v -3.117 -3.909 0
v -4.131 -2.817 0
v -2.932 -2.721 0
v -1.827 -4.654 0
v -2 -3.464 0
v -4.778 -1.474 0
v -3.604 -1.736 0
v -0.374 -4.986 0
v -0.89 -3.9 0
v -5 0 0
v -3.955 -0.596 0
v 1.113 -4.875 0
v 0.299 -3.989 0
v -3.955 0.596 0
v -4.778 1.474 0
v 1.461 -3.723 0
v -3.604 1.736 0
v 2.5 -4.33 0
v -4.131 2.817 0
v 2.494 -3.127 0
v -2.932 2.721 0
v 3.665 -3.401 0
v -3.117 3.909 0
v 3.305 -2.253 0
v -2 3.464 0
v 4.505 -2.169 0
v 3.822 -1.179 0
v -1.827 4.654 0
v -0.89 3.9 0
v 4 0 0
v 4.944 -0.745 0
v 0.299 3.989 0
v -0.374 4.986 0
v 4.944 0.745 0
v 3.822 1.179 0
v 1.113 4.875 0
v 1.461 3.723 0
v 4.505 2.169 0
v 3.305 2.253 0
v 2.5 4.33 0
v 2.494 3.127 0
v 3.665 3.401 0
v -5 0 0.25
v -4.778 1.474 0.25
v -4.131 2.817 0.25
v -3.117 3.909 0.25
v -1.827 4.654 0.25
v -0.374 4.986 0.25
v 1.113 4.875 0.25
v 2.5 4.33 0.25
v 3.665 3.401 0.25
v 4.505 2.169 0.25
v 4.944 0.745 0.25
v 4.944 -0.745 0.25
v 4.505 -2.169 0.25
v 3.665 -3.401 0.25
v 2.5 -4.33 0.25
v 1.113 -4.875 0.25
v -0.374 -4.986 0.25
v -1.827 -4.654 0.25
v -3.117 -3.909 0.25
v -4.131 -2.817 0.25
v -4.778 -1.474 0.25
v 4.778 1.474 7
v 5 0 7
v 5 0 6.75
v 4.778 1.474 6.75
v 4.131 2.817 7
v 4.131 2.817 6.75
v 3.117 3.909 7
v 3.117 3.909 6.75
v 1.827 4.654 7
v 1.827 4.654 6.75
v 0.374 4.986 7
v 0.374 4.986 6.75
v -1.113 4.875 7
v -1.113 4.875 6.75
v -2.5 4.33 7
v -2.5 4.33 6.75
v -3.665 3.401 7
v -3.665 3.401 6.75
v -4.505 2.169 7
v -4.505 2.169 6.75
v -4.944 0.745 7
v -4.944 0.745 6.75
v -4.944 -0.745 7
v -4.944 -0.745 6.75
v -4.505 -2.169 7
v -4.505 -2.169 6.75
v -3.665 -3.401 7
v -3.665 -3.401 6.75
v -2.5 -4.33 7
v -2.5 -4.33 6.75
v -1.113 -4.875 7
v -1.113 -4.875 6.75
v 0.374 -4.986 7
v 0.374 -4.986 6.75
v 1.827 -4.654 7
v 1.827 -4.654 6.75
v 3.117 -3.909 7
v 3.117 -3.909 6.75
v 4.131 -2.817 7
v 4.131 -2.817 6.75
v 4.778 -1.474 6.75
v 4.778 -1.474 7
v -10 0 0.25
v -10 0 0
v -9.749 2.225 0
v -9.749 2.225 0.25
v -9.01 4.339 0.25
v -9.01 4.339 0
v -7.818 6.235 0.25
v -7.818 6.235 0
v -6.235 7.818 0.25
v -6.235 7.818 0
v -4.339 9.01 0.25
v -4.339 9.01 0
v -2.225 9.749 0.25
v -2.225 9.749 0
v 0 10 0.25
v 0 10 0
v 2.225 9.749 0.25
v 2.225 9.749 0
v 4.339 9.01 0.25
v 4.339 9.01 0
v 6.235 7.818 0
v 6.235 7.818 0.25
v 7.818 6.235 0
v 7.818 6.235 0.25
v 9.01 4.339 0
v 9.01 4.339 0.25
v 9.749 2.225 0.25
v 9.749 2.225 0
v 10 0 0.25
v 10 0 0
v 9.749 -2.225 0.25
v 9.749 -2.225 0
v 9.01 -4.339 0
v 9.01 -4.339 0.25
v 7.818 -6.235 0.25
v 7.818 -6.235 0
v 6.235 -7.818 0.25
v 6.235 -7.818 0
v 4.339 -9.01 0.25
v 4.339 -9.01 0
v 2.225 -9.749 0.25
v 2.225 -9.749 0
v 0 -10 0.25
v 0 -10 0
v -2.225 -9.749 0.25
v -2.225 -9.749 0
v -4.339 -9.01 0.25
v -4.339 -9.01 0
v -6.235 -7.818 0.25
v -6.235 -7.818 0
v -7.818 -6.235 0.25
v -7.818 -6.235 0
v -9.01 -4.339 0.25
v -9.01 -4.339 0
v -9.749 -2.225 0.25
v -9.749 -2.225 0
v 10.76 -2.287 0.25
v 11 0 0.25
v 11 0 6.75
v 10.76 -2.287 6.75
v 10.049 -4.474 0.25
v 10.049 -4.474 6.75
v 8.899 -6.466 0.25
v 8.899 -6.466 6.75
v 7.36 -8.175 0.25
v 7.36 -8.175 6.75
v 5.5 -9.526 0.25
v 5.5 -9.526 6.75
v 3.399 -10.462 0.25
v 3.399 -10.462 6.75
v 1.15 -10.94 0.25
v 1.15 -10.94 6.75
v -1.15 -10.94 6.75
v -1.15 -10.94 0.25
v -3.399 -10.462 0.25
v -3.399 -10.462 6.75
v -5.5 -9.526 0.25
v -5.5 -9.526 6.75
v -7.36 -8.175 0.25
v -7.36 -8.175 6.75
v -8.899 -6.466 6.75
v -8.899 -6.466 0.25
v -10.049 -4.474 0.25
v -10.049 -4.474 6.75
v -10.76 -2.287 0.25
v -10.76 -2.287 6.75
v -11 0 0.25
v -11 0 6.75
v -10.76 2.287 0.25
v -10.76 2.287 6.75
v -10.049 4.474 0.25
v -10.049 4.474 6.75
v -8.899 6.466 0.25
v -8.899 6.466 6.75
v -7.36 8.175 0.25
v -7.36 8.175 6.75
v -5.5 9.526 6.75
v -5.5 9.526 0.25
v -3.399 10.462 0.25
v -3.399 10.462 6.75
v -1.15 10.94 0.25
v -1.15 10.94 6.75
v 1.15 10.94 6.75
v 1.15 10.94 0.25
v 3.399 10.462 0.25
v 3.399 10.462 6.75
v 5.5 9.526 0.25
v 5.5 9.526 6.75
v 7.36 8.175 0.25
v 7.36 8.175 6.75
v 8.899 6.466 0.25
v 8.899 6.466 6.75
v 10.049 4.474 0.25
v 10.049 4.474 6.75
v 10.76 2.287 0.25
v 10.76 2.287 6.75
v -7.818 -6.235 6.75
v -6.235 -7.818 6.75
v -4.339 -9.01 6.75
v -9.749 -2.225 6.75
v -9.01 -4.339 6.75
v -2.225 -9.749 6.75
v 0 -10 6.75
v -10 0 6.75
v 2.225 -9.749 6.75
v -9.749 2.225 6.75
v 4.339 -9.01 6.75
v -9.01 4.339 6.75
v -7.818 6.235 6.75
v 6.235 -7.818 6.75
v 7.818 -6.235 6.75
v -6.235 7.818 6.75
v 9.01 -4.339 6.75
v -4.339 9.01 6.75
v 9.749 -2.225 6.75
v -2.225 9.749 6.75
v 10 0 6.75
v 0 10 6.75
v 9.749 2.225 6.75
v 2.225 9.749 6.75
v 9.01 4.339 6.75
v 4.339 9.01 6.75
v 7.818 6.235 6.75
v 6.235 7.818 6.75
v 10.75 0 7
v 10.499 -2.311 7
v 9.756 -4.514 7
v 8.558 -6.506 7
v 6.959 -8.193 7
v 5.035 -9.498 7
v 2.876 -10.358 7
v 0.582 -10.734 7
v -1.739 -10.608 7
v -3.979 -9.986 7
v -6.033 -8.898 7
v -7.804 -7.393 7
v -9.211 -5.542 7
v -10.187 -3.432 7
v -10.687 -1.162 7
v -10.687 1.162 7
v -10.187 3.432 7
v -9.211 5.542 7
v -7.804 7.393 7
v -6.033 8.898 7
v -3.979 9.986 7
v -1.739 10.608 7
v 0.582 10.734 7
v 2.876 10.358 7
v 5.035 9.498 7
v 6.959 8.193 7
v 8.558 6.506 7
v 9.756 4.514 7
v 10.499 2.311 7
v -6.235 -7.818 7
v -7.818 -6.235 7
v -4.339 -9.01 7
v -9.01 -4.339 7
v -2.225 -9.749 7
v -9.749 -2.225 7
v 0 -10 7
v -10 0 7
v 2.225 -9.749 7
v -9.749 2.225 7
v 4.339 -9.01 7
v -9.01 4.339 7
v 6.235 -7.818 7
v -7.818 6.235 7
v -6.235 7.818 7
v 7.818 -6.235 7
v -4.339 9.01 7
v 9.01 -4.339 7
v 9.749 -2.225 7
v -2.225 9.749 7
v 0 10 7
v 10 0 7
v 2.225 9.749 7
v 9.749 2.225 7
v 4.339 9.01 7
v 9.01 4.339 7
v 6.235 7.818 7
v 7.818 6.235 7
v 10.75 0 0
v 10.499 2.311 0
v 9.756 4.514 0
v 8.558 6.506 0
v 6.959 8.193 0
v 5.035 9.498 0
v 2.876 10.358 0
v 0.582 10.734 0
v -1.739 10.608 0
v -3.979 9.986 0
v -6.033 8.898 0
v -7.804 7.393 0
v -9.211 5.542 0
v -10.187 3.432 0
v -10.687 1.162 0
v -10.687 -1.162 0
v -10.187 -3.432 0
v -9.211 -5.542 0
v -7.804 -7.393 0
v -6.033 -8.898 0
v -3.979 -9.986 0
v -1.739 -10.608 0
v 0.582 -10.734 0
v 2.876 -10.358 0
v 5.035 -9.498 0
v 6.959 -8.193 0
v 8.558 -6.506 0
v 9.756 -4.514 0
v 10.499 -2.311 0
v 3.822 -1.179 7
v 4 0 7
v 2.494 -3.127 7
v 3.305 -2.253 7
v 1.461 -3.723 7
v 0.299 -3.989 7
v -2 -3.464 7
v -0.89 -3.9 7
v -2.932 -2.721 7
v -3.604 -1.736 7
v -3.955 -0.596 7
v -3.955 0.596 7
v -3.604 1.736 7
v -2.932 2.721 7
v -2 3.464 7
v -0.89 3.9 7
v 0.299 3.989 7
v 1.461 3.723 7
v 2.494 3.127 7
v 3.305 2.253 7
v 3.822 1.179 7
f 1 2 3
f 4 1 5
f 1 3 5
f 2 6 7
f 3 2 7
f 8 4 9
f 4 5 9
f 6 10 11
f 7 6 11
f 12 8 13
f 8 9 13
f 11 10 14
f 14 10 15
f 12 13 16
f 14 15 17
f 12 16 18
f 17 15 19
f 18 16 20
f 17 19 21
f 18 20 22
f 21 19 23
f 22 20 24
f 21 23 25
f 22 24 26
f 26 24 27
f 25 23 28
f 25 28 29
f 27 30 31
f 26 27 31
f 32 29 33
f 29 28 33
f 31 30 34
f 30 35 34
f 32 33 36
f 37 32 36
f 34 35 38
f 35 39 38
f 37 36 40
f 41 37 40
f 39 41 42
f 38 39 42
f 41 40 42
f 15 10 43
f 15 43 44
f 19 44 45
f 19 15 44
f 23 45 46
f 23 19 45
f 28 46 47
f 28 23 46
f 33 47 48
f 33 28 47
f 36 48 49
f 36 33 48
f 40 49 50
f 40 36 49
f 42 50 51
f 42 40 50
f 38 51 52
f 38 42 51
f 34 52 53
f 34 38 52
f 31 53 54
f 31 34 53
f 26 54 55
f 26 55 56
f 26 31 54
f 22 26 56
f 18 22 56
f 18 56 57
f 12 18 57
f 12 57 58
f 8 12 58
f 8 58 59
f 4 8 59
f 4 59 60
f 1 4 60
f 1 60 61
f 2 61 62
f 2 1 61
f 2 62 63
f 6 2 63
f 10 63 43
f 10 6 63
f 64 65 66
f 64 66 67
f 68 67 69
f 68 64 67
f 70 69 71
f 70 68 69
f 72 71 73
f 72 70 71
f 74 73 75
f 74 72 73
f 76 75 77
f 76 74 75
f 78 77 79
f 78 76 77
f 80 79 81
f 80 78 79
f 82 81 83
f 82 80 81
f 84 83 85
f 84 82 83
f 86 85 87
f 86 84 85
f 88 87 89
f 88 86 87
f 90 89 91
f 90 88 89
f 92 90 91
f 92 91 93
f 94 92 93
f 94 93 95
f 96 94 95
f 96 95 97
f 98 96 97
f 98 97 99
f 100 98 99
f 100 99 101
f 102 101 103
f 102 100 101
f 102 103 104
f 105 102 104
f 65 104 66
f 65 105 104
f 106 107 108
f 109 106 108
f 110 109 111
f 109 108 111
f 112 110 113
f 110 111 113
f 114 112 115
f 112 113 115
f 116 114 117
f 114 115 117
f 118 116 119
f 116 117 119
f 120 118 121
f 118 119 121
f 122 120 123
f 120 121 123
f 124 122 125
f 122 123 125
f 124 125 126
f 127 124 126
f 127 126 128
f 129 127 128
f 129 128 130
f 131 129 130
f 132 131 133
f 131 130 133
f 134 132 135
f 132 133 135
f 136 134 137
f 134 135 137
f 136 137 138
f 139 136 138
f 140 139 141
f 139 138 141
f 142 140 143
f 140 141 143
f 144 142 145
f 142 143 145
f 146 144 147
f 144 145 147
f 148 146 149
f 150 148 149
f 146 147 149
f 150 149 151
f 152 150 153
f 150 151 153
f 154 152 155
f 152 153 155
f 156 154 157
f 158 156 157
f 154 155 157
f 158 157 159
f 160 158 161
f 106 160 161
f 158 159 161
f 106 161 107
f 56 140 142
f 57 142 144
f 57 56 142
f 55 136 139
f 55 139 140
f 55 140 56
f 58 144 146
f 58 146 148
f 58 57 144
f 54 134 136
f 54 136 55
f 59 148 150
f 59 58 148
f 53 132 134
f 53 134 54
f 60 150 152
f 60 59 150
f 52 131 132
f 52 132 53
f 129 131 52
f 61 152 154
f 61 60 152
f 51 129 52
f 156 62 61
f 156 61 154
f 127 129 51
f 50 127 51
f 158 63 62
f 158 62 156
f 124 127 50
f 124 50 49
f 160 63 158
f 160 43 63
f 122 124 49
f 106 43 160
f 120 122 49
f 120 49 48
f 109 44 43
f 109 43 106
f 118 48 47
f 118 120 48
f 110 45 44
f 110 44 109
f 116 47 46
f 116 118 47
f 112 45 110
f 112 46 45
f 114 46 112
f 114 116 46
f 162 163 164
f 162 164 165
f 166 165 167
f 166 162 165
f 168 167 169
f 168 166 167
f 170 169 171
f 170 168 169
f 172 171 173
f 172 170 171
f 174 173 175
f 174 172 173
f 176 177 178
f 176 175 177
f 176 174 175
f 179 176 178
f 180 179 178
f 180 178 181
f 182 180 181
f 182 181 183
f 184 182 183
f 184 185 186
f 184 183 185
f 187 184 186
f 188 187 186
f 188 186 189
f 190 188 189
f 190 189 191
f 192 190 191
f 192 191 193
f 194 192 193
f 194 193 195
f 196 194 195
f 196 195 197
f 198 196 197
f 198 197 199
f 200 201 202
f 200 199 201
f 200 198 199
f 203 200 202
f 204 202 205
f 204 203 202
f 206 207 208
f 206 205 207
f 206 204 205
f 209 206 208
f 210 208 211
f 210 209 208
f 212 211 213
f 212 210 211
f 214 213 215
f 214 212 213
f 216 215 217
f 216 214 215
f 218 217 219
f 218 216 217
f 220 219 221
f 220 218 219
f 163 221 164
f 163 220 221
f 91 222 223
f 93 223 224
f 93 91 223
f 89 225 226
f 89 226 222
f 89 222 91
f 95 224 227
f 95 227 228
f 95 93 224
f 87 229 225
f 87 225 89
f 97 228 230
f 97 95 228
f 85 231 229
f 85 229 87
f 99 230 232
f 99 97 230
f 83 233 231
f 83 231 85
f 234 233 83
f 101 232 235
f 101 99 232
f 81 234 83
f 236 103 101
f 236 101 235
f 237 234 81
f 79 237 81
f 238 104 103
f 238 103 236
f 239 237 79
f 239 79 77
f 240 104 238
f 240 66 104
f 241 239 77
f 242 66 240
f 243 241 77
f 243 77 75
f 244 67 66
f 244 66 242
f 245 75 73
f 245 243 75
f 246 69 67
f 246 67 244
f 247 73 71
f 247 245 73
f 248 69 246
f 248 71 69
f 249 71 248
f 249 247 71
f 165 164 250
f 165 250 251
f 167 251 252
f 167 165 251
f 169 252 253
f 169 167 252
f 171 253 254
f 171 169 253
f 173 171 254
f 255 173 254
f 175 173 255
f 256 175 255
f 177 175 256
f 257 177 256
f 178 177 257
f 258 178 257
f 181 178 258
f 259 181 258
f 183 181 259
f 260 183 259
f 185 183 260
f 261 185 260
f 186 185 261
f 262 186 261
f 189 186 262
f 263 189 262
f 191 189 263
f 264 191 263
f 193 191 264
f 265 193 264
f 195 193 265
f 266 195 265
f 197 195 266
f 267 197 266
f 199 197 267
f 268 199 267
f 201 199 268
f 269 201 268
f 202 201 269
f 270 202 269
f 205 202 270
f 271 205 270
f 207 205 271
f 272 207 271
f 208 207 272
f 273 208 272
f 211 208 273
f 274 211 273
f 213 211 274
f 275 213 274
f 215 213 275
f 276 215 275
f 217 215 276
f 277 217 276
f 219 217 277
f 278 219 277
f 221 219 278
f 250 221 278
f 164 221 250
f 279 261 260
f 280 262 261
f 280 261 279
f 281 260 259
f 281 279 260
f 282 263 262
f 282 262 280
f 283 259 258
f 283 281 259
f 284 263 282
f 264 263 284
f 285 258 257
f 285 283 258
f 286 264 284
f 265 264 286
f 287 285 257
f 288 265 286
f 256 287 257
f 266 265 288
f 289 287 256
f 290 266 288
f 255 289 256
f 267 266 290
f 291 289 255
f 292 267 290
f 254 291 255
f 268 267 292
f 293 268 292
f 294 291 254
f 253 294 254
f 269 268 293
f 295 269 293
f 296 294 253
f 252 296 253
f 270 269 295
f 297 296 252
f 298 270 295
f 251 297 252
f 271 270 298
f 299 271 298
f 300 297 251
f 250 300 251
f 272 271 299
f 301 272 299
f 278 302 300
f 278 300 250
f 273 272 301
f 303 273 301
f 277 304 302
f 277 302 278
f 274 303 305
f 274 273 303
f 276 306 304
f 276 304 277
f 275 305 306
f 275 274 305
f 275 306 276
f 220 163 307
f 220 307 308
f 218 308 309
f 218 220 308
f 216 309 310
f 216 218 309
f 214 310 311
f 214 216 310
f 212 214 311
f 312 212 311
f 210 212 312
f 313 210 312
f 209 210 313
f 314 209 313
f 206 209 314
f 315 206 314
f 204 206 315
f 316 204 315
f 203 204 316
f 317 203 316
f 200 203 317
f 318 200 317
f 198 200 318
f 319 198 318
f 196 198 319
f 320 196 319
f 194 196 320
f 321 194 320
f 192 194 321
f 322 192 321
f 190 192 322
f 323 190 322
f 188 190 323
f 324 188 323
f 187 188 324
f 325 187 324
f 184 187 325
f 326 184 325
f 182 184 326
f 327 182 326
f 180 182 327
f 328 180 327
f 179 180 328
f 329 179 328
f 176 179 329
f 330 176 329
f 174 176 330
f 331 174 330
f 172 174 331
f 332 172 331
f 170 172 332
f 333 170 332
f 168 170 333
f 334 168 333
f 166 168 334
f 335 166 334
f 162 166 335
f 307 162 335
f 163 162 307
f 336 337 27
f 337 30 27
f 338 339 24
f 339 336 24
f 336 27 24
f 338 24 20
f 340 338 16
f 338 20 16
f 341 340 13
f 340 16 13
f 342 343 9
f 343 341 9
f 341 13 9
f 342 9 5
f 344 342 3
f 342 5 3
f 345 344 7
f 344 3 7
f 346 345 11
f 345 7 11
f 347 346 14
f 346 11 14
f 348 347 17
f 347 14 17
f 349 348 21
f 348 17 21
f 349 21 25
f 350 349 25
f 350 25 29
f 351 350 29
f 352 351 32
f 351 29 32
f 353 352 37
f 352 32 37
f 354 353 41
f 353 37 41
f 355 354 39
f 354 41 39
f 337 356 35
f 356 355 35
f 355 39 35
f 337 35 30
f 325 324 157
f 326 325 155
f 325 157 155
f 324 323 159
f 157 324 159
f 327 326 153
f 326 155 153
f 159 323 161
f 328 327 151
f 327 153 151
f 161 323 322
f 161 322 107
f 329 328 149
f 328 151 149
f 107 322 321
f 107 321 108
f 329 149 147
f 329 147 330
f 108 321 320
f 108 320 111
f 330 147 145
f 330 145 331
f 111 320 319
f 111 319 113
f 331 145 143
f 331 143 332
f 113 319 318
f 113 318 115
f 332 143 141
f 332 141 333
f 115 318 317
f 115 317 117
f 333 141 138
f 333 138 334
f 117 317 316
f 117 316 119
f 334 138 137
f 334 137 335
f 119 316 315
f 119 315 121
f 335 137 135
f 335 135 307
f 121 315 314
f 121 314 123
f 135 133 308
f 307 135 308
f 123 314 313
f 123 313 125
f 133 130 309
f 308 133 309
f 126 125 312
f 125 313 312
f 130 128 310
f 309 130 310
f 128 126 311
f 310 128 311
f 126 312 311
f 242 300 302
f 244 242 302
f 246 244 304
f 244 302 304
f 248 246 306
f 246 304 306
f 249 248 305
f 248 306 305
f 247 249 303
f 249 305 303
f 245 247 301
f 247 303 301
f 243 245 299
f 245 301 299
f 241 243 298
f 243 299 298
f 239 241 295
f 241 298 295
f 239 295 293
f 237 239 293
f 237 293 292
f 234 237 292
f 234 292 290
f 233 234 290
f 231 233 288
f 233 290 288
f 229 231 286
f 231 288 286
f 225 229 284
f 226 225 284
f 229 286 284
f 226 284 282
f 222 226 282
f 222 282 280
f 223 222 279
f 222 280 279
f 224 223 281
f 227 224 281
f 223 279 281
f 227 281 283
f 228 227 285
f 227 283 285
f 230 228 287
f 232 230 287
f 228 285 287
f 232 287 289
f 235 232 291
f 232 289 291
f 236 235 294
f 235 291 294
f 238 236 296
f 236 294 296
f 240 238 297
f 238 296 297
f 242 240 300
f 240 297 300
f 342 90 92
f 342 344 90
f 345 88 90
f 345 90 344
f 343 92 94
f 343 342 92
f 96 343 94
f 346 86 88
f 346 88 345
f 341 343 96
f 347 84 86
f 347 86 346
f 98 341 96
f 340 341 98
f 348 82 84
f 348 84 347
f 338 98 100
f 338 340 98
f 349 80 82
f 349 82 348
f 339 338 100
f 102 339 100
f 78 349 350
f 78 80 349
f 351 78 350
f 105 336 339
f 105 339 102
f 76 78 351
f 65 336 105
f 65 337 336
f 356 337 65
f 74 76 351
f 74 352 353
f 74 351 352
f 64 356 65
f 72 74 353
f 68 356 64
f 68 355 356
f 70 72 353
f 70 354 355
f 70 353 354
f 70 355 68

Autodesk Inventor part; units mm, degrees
ref_plane "YZ Plane" through (0, 0, 0) normal (1, 0, 0) x (0, 1, 0)
ref_plane "XZ Plane" through (0, 0, 0) normal (0, 1, 0) x (-1, 0, 0)
ref_plane "XY Plane" through (0, 0, 0) normal (0, 0, 1) x (1, 0, 0)
sketch "Sketch1" plane through (0, 0, 0) normal (0, 0, 1) x (1, 0, 0)
  circle A0 centre (0, 0) radius 11
  circle A1 centre (0, 0) radius 4
  dimension "d0" = 22
  dimension "d1" = 8
extrude "Extrusion1" add sketch "Sketch1" along normal blind 7
sketch "Sketch2" plane through (0, 0, 7) normal (0, 0, 1) x (1, 0, 0)
  circle A0 centre (0, 0) radius 5
  circle A1 centre (0, 0) radius 10
  circle A2 centre (0, 0) radius 11 projected
  circle A3 centre (0, 0) radius 4 projected
  dimension "d4" = 1
  dimension "d5" = 1
extrude "Extrusion2" cut sketch "Sketch2" against normal blind 0.25 contours A1
sketch "Sketch3" plane through (0, 0, 0) normal (0, 0, -1) x (-1, 0, 0)
  circle A0 centre (0, 0) radius 10 projected
  circle A1 centre (0, 0) radius 5 projected
extrude "Extrusion3" cut sketch "Sketch3" against normal blind 0.25
chamfer "Chamfer1" distance 0.25 angle 45 2 edges at (-11, 0, 7) (-11, 0, 0)
properties part number "bearing_22x8x7"
